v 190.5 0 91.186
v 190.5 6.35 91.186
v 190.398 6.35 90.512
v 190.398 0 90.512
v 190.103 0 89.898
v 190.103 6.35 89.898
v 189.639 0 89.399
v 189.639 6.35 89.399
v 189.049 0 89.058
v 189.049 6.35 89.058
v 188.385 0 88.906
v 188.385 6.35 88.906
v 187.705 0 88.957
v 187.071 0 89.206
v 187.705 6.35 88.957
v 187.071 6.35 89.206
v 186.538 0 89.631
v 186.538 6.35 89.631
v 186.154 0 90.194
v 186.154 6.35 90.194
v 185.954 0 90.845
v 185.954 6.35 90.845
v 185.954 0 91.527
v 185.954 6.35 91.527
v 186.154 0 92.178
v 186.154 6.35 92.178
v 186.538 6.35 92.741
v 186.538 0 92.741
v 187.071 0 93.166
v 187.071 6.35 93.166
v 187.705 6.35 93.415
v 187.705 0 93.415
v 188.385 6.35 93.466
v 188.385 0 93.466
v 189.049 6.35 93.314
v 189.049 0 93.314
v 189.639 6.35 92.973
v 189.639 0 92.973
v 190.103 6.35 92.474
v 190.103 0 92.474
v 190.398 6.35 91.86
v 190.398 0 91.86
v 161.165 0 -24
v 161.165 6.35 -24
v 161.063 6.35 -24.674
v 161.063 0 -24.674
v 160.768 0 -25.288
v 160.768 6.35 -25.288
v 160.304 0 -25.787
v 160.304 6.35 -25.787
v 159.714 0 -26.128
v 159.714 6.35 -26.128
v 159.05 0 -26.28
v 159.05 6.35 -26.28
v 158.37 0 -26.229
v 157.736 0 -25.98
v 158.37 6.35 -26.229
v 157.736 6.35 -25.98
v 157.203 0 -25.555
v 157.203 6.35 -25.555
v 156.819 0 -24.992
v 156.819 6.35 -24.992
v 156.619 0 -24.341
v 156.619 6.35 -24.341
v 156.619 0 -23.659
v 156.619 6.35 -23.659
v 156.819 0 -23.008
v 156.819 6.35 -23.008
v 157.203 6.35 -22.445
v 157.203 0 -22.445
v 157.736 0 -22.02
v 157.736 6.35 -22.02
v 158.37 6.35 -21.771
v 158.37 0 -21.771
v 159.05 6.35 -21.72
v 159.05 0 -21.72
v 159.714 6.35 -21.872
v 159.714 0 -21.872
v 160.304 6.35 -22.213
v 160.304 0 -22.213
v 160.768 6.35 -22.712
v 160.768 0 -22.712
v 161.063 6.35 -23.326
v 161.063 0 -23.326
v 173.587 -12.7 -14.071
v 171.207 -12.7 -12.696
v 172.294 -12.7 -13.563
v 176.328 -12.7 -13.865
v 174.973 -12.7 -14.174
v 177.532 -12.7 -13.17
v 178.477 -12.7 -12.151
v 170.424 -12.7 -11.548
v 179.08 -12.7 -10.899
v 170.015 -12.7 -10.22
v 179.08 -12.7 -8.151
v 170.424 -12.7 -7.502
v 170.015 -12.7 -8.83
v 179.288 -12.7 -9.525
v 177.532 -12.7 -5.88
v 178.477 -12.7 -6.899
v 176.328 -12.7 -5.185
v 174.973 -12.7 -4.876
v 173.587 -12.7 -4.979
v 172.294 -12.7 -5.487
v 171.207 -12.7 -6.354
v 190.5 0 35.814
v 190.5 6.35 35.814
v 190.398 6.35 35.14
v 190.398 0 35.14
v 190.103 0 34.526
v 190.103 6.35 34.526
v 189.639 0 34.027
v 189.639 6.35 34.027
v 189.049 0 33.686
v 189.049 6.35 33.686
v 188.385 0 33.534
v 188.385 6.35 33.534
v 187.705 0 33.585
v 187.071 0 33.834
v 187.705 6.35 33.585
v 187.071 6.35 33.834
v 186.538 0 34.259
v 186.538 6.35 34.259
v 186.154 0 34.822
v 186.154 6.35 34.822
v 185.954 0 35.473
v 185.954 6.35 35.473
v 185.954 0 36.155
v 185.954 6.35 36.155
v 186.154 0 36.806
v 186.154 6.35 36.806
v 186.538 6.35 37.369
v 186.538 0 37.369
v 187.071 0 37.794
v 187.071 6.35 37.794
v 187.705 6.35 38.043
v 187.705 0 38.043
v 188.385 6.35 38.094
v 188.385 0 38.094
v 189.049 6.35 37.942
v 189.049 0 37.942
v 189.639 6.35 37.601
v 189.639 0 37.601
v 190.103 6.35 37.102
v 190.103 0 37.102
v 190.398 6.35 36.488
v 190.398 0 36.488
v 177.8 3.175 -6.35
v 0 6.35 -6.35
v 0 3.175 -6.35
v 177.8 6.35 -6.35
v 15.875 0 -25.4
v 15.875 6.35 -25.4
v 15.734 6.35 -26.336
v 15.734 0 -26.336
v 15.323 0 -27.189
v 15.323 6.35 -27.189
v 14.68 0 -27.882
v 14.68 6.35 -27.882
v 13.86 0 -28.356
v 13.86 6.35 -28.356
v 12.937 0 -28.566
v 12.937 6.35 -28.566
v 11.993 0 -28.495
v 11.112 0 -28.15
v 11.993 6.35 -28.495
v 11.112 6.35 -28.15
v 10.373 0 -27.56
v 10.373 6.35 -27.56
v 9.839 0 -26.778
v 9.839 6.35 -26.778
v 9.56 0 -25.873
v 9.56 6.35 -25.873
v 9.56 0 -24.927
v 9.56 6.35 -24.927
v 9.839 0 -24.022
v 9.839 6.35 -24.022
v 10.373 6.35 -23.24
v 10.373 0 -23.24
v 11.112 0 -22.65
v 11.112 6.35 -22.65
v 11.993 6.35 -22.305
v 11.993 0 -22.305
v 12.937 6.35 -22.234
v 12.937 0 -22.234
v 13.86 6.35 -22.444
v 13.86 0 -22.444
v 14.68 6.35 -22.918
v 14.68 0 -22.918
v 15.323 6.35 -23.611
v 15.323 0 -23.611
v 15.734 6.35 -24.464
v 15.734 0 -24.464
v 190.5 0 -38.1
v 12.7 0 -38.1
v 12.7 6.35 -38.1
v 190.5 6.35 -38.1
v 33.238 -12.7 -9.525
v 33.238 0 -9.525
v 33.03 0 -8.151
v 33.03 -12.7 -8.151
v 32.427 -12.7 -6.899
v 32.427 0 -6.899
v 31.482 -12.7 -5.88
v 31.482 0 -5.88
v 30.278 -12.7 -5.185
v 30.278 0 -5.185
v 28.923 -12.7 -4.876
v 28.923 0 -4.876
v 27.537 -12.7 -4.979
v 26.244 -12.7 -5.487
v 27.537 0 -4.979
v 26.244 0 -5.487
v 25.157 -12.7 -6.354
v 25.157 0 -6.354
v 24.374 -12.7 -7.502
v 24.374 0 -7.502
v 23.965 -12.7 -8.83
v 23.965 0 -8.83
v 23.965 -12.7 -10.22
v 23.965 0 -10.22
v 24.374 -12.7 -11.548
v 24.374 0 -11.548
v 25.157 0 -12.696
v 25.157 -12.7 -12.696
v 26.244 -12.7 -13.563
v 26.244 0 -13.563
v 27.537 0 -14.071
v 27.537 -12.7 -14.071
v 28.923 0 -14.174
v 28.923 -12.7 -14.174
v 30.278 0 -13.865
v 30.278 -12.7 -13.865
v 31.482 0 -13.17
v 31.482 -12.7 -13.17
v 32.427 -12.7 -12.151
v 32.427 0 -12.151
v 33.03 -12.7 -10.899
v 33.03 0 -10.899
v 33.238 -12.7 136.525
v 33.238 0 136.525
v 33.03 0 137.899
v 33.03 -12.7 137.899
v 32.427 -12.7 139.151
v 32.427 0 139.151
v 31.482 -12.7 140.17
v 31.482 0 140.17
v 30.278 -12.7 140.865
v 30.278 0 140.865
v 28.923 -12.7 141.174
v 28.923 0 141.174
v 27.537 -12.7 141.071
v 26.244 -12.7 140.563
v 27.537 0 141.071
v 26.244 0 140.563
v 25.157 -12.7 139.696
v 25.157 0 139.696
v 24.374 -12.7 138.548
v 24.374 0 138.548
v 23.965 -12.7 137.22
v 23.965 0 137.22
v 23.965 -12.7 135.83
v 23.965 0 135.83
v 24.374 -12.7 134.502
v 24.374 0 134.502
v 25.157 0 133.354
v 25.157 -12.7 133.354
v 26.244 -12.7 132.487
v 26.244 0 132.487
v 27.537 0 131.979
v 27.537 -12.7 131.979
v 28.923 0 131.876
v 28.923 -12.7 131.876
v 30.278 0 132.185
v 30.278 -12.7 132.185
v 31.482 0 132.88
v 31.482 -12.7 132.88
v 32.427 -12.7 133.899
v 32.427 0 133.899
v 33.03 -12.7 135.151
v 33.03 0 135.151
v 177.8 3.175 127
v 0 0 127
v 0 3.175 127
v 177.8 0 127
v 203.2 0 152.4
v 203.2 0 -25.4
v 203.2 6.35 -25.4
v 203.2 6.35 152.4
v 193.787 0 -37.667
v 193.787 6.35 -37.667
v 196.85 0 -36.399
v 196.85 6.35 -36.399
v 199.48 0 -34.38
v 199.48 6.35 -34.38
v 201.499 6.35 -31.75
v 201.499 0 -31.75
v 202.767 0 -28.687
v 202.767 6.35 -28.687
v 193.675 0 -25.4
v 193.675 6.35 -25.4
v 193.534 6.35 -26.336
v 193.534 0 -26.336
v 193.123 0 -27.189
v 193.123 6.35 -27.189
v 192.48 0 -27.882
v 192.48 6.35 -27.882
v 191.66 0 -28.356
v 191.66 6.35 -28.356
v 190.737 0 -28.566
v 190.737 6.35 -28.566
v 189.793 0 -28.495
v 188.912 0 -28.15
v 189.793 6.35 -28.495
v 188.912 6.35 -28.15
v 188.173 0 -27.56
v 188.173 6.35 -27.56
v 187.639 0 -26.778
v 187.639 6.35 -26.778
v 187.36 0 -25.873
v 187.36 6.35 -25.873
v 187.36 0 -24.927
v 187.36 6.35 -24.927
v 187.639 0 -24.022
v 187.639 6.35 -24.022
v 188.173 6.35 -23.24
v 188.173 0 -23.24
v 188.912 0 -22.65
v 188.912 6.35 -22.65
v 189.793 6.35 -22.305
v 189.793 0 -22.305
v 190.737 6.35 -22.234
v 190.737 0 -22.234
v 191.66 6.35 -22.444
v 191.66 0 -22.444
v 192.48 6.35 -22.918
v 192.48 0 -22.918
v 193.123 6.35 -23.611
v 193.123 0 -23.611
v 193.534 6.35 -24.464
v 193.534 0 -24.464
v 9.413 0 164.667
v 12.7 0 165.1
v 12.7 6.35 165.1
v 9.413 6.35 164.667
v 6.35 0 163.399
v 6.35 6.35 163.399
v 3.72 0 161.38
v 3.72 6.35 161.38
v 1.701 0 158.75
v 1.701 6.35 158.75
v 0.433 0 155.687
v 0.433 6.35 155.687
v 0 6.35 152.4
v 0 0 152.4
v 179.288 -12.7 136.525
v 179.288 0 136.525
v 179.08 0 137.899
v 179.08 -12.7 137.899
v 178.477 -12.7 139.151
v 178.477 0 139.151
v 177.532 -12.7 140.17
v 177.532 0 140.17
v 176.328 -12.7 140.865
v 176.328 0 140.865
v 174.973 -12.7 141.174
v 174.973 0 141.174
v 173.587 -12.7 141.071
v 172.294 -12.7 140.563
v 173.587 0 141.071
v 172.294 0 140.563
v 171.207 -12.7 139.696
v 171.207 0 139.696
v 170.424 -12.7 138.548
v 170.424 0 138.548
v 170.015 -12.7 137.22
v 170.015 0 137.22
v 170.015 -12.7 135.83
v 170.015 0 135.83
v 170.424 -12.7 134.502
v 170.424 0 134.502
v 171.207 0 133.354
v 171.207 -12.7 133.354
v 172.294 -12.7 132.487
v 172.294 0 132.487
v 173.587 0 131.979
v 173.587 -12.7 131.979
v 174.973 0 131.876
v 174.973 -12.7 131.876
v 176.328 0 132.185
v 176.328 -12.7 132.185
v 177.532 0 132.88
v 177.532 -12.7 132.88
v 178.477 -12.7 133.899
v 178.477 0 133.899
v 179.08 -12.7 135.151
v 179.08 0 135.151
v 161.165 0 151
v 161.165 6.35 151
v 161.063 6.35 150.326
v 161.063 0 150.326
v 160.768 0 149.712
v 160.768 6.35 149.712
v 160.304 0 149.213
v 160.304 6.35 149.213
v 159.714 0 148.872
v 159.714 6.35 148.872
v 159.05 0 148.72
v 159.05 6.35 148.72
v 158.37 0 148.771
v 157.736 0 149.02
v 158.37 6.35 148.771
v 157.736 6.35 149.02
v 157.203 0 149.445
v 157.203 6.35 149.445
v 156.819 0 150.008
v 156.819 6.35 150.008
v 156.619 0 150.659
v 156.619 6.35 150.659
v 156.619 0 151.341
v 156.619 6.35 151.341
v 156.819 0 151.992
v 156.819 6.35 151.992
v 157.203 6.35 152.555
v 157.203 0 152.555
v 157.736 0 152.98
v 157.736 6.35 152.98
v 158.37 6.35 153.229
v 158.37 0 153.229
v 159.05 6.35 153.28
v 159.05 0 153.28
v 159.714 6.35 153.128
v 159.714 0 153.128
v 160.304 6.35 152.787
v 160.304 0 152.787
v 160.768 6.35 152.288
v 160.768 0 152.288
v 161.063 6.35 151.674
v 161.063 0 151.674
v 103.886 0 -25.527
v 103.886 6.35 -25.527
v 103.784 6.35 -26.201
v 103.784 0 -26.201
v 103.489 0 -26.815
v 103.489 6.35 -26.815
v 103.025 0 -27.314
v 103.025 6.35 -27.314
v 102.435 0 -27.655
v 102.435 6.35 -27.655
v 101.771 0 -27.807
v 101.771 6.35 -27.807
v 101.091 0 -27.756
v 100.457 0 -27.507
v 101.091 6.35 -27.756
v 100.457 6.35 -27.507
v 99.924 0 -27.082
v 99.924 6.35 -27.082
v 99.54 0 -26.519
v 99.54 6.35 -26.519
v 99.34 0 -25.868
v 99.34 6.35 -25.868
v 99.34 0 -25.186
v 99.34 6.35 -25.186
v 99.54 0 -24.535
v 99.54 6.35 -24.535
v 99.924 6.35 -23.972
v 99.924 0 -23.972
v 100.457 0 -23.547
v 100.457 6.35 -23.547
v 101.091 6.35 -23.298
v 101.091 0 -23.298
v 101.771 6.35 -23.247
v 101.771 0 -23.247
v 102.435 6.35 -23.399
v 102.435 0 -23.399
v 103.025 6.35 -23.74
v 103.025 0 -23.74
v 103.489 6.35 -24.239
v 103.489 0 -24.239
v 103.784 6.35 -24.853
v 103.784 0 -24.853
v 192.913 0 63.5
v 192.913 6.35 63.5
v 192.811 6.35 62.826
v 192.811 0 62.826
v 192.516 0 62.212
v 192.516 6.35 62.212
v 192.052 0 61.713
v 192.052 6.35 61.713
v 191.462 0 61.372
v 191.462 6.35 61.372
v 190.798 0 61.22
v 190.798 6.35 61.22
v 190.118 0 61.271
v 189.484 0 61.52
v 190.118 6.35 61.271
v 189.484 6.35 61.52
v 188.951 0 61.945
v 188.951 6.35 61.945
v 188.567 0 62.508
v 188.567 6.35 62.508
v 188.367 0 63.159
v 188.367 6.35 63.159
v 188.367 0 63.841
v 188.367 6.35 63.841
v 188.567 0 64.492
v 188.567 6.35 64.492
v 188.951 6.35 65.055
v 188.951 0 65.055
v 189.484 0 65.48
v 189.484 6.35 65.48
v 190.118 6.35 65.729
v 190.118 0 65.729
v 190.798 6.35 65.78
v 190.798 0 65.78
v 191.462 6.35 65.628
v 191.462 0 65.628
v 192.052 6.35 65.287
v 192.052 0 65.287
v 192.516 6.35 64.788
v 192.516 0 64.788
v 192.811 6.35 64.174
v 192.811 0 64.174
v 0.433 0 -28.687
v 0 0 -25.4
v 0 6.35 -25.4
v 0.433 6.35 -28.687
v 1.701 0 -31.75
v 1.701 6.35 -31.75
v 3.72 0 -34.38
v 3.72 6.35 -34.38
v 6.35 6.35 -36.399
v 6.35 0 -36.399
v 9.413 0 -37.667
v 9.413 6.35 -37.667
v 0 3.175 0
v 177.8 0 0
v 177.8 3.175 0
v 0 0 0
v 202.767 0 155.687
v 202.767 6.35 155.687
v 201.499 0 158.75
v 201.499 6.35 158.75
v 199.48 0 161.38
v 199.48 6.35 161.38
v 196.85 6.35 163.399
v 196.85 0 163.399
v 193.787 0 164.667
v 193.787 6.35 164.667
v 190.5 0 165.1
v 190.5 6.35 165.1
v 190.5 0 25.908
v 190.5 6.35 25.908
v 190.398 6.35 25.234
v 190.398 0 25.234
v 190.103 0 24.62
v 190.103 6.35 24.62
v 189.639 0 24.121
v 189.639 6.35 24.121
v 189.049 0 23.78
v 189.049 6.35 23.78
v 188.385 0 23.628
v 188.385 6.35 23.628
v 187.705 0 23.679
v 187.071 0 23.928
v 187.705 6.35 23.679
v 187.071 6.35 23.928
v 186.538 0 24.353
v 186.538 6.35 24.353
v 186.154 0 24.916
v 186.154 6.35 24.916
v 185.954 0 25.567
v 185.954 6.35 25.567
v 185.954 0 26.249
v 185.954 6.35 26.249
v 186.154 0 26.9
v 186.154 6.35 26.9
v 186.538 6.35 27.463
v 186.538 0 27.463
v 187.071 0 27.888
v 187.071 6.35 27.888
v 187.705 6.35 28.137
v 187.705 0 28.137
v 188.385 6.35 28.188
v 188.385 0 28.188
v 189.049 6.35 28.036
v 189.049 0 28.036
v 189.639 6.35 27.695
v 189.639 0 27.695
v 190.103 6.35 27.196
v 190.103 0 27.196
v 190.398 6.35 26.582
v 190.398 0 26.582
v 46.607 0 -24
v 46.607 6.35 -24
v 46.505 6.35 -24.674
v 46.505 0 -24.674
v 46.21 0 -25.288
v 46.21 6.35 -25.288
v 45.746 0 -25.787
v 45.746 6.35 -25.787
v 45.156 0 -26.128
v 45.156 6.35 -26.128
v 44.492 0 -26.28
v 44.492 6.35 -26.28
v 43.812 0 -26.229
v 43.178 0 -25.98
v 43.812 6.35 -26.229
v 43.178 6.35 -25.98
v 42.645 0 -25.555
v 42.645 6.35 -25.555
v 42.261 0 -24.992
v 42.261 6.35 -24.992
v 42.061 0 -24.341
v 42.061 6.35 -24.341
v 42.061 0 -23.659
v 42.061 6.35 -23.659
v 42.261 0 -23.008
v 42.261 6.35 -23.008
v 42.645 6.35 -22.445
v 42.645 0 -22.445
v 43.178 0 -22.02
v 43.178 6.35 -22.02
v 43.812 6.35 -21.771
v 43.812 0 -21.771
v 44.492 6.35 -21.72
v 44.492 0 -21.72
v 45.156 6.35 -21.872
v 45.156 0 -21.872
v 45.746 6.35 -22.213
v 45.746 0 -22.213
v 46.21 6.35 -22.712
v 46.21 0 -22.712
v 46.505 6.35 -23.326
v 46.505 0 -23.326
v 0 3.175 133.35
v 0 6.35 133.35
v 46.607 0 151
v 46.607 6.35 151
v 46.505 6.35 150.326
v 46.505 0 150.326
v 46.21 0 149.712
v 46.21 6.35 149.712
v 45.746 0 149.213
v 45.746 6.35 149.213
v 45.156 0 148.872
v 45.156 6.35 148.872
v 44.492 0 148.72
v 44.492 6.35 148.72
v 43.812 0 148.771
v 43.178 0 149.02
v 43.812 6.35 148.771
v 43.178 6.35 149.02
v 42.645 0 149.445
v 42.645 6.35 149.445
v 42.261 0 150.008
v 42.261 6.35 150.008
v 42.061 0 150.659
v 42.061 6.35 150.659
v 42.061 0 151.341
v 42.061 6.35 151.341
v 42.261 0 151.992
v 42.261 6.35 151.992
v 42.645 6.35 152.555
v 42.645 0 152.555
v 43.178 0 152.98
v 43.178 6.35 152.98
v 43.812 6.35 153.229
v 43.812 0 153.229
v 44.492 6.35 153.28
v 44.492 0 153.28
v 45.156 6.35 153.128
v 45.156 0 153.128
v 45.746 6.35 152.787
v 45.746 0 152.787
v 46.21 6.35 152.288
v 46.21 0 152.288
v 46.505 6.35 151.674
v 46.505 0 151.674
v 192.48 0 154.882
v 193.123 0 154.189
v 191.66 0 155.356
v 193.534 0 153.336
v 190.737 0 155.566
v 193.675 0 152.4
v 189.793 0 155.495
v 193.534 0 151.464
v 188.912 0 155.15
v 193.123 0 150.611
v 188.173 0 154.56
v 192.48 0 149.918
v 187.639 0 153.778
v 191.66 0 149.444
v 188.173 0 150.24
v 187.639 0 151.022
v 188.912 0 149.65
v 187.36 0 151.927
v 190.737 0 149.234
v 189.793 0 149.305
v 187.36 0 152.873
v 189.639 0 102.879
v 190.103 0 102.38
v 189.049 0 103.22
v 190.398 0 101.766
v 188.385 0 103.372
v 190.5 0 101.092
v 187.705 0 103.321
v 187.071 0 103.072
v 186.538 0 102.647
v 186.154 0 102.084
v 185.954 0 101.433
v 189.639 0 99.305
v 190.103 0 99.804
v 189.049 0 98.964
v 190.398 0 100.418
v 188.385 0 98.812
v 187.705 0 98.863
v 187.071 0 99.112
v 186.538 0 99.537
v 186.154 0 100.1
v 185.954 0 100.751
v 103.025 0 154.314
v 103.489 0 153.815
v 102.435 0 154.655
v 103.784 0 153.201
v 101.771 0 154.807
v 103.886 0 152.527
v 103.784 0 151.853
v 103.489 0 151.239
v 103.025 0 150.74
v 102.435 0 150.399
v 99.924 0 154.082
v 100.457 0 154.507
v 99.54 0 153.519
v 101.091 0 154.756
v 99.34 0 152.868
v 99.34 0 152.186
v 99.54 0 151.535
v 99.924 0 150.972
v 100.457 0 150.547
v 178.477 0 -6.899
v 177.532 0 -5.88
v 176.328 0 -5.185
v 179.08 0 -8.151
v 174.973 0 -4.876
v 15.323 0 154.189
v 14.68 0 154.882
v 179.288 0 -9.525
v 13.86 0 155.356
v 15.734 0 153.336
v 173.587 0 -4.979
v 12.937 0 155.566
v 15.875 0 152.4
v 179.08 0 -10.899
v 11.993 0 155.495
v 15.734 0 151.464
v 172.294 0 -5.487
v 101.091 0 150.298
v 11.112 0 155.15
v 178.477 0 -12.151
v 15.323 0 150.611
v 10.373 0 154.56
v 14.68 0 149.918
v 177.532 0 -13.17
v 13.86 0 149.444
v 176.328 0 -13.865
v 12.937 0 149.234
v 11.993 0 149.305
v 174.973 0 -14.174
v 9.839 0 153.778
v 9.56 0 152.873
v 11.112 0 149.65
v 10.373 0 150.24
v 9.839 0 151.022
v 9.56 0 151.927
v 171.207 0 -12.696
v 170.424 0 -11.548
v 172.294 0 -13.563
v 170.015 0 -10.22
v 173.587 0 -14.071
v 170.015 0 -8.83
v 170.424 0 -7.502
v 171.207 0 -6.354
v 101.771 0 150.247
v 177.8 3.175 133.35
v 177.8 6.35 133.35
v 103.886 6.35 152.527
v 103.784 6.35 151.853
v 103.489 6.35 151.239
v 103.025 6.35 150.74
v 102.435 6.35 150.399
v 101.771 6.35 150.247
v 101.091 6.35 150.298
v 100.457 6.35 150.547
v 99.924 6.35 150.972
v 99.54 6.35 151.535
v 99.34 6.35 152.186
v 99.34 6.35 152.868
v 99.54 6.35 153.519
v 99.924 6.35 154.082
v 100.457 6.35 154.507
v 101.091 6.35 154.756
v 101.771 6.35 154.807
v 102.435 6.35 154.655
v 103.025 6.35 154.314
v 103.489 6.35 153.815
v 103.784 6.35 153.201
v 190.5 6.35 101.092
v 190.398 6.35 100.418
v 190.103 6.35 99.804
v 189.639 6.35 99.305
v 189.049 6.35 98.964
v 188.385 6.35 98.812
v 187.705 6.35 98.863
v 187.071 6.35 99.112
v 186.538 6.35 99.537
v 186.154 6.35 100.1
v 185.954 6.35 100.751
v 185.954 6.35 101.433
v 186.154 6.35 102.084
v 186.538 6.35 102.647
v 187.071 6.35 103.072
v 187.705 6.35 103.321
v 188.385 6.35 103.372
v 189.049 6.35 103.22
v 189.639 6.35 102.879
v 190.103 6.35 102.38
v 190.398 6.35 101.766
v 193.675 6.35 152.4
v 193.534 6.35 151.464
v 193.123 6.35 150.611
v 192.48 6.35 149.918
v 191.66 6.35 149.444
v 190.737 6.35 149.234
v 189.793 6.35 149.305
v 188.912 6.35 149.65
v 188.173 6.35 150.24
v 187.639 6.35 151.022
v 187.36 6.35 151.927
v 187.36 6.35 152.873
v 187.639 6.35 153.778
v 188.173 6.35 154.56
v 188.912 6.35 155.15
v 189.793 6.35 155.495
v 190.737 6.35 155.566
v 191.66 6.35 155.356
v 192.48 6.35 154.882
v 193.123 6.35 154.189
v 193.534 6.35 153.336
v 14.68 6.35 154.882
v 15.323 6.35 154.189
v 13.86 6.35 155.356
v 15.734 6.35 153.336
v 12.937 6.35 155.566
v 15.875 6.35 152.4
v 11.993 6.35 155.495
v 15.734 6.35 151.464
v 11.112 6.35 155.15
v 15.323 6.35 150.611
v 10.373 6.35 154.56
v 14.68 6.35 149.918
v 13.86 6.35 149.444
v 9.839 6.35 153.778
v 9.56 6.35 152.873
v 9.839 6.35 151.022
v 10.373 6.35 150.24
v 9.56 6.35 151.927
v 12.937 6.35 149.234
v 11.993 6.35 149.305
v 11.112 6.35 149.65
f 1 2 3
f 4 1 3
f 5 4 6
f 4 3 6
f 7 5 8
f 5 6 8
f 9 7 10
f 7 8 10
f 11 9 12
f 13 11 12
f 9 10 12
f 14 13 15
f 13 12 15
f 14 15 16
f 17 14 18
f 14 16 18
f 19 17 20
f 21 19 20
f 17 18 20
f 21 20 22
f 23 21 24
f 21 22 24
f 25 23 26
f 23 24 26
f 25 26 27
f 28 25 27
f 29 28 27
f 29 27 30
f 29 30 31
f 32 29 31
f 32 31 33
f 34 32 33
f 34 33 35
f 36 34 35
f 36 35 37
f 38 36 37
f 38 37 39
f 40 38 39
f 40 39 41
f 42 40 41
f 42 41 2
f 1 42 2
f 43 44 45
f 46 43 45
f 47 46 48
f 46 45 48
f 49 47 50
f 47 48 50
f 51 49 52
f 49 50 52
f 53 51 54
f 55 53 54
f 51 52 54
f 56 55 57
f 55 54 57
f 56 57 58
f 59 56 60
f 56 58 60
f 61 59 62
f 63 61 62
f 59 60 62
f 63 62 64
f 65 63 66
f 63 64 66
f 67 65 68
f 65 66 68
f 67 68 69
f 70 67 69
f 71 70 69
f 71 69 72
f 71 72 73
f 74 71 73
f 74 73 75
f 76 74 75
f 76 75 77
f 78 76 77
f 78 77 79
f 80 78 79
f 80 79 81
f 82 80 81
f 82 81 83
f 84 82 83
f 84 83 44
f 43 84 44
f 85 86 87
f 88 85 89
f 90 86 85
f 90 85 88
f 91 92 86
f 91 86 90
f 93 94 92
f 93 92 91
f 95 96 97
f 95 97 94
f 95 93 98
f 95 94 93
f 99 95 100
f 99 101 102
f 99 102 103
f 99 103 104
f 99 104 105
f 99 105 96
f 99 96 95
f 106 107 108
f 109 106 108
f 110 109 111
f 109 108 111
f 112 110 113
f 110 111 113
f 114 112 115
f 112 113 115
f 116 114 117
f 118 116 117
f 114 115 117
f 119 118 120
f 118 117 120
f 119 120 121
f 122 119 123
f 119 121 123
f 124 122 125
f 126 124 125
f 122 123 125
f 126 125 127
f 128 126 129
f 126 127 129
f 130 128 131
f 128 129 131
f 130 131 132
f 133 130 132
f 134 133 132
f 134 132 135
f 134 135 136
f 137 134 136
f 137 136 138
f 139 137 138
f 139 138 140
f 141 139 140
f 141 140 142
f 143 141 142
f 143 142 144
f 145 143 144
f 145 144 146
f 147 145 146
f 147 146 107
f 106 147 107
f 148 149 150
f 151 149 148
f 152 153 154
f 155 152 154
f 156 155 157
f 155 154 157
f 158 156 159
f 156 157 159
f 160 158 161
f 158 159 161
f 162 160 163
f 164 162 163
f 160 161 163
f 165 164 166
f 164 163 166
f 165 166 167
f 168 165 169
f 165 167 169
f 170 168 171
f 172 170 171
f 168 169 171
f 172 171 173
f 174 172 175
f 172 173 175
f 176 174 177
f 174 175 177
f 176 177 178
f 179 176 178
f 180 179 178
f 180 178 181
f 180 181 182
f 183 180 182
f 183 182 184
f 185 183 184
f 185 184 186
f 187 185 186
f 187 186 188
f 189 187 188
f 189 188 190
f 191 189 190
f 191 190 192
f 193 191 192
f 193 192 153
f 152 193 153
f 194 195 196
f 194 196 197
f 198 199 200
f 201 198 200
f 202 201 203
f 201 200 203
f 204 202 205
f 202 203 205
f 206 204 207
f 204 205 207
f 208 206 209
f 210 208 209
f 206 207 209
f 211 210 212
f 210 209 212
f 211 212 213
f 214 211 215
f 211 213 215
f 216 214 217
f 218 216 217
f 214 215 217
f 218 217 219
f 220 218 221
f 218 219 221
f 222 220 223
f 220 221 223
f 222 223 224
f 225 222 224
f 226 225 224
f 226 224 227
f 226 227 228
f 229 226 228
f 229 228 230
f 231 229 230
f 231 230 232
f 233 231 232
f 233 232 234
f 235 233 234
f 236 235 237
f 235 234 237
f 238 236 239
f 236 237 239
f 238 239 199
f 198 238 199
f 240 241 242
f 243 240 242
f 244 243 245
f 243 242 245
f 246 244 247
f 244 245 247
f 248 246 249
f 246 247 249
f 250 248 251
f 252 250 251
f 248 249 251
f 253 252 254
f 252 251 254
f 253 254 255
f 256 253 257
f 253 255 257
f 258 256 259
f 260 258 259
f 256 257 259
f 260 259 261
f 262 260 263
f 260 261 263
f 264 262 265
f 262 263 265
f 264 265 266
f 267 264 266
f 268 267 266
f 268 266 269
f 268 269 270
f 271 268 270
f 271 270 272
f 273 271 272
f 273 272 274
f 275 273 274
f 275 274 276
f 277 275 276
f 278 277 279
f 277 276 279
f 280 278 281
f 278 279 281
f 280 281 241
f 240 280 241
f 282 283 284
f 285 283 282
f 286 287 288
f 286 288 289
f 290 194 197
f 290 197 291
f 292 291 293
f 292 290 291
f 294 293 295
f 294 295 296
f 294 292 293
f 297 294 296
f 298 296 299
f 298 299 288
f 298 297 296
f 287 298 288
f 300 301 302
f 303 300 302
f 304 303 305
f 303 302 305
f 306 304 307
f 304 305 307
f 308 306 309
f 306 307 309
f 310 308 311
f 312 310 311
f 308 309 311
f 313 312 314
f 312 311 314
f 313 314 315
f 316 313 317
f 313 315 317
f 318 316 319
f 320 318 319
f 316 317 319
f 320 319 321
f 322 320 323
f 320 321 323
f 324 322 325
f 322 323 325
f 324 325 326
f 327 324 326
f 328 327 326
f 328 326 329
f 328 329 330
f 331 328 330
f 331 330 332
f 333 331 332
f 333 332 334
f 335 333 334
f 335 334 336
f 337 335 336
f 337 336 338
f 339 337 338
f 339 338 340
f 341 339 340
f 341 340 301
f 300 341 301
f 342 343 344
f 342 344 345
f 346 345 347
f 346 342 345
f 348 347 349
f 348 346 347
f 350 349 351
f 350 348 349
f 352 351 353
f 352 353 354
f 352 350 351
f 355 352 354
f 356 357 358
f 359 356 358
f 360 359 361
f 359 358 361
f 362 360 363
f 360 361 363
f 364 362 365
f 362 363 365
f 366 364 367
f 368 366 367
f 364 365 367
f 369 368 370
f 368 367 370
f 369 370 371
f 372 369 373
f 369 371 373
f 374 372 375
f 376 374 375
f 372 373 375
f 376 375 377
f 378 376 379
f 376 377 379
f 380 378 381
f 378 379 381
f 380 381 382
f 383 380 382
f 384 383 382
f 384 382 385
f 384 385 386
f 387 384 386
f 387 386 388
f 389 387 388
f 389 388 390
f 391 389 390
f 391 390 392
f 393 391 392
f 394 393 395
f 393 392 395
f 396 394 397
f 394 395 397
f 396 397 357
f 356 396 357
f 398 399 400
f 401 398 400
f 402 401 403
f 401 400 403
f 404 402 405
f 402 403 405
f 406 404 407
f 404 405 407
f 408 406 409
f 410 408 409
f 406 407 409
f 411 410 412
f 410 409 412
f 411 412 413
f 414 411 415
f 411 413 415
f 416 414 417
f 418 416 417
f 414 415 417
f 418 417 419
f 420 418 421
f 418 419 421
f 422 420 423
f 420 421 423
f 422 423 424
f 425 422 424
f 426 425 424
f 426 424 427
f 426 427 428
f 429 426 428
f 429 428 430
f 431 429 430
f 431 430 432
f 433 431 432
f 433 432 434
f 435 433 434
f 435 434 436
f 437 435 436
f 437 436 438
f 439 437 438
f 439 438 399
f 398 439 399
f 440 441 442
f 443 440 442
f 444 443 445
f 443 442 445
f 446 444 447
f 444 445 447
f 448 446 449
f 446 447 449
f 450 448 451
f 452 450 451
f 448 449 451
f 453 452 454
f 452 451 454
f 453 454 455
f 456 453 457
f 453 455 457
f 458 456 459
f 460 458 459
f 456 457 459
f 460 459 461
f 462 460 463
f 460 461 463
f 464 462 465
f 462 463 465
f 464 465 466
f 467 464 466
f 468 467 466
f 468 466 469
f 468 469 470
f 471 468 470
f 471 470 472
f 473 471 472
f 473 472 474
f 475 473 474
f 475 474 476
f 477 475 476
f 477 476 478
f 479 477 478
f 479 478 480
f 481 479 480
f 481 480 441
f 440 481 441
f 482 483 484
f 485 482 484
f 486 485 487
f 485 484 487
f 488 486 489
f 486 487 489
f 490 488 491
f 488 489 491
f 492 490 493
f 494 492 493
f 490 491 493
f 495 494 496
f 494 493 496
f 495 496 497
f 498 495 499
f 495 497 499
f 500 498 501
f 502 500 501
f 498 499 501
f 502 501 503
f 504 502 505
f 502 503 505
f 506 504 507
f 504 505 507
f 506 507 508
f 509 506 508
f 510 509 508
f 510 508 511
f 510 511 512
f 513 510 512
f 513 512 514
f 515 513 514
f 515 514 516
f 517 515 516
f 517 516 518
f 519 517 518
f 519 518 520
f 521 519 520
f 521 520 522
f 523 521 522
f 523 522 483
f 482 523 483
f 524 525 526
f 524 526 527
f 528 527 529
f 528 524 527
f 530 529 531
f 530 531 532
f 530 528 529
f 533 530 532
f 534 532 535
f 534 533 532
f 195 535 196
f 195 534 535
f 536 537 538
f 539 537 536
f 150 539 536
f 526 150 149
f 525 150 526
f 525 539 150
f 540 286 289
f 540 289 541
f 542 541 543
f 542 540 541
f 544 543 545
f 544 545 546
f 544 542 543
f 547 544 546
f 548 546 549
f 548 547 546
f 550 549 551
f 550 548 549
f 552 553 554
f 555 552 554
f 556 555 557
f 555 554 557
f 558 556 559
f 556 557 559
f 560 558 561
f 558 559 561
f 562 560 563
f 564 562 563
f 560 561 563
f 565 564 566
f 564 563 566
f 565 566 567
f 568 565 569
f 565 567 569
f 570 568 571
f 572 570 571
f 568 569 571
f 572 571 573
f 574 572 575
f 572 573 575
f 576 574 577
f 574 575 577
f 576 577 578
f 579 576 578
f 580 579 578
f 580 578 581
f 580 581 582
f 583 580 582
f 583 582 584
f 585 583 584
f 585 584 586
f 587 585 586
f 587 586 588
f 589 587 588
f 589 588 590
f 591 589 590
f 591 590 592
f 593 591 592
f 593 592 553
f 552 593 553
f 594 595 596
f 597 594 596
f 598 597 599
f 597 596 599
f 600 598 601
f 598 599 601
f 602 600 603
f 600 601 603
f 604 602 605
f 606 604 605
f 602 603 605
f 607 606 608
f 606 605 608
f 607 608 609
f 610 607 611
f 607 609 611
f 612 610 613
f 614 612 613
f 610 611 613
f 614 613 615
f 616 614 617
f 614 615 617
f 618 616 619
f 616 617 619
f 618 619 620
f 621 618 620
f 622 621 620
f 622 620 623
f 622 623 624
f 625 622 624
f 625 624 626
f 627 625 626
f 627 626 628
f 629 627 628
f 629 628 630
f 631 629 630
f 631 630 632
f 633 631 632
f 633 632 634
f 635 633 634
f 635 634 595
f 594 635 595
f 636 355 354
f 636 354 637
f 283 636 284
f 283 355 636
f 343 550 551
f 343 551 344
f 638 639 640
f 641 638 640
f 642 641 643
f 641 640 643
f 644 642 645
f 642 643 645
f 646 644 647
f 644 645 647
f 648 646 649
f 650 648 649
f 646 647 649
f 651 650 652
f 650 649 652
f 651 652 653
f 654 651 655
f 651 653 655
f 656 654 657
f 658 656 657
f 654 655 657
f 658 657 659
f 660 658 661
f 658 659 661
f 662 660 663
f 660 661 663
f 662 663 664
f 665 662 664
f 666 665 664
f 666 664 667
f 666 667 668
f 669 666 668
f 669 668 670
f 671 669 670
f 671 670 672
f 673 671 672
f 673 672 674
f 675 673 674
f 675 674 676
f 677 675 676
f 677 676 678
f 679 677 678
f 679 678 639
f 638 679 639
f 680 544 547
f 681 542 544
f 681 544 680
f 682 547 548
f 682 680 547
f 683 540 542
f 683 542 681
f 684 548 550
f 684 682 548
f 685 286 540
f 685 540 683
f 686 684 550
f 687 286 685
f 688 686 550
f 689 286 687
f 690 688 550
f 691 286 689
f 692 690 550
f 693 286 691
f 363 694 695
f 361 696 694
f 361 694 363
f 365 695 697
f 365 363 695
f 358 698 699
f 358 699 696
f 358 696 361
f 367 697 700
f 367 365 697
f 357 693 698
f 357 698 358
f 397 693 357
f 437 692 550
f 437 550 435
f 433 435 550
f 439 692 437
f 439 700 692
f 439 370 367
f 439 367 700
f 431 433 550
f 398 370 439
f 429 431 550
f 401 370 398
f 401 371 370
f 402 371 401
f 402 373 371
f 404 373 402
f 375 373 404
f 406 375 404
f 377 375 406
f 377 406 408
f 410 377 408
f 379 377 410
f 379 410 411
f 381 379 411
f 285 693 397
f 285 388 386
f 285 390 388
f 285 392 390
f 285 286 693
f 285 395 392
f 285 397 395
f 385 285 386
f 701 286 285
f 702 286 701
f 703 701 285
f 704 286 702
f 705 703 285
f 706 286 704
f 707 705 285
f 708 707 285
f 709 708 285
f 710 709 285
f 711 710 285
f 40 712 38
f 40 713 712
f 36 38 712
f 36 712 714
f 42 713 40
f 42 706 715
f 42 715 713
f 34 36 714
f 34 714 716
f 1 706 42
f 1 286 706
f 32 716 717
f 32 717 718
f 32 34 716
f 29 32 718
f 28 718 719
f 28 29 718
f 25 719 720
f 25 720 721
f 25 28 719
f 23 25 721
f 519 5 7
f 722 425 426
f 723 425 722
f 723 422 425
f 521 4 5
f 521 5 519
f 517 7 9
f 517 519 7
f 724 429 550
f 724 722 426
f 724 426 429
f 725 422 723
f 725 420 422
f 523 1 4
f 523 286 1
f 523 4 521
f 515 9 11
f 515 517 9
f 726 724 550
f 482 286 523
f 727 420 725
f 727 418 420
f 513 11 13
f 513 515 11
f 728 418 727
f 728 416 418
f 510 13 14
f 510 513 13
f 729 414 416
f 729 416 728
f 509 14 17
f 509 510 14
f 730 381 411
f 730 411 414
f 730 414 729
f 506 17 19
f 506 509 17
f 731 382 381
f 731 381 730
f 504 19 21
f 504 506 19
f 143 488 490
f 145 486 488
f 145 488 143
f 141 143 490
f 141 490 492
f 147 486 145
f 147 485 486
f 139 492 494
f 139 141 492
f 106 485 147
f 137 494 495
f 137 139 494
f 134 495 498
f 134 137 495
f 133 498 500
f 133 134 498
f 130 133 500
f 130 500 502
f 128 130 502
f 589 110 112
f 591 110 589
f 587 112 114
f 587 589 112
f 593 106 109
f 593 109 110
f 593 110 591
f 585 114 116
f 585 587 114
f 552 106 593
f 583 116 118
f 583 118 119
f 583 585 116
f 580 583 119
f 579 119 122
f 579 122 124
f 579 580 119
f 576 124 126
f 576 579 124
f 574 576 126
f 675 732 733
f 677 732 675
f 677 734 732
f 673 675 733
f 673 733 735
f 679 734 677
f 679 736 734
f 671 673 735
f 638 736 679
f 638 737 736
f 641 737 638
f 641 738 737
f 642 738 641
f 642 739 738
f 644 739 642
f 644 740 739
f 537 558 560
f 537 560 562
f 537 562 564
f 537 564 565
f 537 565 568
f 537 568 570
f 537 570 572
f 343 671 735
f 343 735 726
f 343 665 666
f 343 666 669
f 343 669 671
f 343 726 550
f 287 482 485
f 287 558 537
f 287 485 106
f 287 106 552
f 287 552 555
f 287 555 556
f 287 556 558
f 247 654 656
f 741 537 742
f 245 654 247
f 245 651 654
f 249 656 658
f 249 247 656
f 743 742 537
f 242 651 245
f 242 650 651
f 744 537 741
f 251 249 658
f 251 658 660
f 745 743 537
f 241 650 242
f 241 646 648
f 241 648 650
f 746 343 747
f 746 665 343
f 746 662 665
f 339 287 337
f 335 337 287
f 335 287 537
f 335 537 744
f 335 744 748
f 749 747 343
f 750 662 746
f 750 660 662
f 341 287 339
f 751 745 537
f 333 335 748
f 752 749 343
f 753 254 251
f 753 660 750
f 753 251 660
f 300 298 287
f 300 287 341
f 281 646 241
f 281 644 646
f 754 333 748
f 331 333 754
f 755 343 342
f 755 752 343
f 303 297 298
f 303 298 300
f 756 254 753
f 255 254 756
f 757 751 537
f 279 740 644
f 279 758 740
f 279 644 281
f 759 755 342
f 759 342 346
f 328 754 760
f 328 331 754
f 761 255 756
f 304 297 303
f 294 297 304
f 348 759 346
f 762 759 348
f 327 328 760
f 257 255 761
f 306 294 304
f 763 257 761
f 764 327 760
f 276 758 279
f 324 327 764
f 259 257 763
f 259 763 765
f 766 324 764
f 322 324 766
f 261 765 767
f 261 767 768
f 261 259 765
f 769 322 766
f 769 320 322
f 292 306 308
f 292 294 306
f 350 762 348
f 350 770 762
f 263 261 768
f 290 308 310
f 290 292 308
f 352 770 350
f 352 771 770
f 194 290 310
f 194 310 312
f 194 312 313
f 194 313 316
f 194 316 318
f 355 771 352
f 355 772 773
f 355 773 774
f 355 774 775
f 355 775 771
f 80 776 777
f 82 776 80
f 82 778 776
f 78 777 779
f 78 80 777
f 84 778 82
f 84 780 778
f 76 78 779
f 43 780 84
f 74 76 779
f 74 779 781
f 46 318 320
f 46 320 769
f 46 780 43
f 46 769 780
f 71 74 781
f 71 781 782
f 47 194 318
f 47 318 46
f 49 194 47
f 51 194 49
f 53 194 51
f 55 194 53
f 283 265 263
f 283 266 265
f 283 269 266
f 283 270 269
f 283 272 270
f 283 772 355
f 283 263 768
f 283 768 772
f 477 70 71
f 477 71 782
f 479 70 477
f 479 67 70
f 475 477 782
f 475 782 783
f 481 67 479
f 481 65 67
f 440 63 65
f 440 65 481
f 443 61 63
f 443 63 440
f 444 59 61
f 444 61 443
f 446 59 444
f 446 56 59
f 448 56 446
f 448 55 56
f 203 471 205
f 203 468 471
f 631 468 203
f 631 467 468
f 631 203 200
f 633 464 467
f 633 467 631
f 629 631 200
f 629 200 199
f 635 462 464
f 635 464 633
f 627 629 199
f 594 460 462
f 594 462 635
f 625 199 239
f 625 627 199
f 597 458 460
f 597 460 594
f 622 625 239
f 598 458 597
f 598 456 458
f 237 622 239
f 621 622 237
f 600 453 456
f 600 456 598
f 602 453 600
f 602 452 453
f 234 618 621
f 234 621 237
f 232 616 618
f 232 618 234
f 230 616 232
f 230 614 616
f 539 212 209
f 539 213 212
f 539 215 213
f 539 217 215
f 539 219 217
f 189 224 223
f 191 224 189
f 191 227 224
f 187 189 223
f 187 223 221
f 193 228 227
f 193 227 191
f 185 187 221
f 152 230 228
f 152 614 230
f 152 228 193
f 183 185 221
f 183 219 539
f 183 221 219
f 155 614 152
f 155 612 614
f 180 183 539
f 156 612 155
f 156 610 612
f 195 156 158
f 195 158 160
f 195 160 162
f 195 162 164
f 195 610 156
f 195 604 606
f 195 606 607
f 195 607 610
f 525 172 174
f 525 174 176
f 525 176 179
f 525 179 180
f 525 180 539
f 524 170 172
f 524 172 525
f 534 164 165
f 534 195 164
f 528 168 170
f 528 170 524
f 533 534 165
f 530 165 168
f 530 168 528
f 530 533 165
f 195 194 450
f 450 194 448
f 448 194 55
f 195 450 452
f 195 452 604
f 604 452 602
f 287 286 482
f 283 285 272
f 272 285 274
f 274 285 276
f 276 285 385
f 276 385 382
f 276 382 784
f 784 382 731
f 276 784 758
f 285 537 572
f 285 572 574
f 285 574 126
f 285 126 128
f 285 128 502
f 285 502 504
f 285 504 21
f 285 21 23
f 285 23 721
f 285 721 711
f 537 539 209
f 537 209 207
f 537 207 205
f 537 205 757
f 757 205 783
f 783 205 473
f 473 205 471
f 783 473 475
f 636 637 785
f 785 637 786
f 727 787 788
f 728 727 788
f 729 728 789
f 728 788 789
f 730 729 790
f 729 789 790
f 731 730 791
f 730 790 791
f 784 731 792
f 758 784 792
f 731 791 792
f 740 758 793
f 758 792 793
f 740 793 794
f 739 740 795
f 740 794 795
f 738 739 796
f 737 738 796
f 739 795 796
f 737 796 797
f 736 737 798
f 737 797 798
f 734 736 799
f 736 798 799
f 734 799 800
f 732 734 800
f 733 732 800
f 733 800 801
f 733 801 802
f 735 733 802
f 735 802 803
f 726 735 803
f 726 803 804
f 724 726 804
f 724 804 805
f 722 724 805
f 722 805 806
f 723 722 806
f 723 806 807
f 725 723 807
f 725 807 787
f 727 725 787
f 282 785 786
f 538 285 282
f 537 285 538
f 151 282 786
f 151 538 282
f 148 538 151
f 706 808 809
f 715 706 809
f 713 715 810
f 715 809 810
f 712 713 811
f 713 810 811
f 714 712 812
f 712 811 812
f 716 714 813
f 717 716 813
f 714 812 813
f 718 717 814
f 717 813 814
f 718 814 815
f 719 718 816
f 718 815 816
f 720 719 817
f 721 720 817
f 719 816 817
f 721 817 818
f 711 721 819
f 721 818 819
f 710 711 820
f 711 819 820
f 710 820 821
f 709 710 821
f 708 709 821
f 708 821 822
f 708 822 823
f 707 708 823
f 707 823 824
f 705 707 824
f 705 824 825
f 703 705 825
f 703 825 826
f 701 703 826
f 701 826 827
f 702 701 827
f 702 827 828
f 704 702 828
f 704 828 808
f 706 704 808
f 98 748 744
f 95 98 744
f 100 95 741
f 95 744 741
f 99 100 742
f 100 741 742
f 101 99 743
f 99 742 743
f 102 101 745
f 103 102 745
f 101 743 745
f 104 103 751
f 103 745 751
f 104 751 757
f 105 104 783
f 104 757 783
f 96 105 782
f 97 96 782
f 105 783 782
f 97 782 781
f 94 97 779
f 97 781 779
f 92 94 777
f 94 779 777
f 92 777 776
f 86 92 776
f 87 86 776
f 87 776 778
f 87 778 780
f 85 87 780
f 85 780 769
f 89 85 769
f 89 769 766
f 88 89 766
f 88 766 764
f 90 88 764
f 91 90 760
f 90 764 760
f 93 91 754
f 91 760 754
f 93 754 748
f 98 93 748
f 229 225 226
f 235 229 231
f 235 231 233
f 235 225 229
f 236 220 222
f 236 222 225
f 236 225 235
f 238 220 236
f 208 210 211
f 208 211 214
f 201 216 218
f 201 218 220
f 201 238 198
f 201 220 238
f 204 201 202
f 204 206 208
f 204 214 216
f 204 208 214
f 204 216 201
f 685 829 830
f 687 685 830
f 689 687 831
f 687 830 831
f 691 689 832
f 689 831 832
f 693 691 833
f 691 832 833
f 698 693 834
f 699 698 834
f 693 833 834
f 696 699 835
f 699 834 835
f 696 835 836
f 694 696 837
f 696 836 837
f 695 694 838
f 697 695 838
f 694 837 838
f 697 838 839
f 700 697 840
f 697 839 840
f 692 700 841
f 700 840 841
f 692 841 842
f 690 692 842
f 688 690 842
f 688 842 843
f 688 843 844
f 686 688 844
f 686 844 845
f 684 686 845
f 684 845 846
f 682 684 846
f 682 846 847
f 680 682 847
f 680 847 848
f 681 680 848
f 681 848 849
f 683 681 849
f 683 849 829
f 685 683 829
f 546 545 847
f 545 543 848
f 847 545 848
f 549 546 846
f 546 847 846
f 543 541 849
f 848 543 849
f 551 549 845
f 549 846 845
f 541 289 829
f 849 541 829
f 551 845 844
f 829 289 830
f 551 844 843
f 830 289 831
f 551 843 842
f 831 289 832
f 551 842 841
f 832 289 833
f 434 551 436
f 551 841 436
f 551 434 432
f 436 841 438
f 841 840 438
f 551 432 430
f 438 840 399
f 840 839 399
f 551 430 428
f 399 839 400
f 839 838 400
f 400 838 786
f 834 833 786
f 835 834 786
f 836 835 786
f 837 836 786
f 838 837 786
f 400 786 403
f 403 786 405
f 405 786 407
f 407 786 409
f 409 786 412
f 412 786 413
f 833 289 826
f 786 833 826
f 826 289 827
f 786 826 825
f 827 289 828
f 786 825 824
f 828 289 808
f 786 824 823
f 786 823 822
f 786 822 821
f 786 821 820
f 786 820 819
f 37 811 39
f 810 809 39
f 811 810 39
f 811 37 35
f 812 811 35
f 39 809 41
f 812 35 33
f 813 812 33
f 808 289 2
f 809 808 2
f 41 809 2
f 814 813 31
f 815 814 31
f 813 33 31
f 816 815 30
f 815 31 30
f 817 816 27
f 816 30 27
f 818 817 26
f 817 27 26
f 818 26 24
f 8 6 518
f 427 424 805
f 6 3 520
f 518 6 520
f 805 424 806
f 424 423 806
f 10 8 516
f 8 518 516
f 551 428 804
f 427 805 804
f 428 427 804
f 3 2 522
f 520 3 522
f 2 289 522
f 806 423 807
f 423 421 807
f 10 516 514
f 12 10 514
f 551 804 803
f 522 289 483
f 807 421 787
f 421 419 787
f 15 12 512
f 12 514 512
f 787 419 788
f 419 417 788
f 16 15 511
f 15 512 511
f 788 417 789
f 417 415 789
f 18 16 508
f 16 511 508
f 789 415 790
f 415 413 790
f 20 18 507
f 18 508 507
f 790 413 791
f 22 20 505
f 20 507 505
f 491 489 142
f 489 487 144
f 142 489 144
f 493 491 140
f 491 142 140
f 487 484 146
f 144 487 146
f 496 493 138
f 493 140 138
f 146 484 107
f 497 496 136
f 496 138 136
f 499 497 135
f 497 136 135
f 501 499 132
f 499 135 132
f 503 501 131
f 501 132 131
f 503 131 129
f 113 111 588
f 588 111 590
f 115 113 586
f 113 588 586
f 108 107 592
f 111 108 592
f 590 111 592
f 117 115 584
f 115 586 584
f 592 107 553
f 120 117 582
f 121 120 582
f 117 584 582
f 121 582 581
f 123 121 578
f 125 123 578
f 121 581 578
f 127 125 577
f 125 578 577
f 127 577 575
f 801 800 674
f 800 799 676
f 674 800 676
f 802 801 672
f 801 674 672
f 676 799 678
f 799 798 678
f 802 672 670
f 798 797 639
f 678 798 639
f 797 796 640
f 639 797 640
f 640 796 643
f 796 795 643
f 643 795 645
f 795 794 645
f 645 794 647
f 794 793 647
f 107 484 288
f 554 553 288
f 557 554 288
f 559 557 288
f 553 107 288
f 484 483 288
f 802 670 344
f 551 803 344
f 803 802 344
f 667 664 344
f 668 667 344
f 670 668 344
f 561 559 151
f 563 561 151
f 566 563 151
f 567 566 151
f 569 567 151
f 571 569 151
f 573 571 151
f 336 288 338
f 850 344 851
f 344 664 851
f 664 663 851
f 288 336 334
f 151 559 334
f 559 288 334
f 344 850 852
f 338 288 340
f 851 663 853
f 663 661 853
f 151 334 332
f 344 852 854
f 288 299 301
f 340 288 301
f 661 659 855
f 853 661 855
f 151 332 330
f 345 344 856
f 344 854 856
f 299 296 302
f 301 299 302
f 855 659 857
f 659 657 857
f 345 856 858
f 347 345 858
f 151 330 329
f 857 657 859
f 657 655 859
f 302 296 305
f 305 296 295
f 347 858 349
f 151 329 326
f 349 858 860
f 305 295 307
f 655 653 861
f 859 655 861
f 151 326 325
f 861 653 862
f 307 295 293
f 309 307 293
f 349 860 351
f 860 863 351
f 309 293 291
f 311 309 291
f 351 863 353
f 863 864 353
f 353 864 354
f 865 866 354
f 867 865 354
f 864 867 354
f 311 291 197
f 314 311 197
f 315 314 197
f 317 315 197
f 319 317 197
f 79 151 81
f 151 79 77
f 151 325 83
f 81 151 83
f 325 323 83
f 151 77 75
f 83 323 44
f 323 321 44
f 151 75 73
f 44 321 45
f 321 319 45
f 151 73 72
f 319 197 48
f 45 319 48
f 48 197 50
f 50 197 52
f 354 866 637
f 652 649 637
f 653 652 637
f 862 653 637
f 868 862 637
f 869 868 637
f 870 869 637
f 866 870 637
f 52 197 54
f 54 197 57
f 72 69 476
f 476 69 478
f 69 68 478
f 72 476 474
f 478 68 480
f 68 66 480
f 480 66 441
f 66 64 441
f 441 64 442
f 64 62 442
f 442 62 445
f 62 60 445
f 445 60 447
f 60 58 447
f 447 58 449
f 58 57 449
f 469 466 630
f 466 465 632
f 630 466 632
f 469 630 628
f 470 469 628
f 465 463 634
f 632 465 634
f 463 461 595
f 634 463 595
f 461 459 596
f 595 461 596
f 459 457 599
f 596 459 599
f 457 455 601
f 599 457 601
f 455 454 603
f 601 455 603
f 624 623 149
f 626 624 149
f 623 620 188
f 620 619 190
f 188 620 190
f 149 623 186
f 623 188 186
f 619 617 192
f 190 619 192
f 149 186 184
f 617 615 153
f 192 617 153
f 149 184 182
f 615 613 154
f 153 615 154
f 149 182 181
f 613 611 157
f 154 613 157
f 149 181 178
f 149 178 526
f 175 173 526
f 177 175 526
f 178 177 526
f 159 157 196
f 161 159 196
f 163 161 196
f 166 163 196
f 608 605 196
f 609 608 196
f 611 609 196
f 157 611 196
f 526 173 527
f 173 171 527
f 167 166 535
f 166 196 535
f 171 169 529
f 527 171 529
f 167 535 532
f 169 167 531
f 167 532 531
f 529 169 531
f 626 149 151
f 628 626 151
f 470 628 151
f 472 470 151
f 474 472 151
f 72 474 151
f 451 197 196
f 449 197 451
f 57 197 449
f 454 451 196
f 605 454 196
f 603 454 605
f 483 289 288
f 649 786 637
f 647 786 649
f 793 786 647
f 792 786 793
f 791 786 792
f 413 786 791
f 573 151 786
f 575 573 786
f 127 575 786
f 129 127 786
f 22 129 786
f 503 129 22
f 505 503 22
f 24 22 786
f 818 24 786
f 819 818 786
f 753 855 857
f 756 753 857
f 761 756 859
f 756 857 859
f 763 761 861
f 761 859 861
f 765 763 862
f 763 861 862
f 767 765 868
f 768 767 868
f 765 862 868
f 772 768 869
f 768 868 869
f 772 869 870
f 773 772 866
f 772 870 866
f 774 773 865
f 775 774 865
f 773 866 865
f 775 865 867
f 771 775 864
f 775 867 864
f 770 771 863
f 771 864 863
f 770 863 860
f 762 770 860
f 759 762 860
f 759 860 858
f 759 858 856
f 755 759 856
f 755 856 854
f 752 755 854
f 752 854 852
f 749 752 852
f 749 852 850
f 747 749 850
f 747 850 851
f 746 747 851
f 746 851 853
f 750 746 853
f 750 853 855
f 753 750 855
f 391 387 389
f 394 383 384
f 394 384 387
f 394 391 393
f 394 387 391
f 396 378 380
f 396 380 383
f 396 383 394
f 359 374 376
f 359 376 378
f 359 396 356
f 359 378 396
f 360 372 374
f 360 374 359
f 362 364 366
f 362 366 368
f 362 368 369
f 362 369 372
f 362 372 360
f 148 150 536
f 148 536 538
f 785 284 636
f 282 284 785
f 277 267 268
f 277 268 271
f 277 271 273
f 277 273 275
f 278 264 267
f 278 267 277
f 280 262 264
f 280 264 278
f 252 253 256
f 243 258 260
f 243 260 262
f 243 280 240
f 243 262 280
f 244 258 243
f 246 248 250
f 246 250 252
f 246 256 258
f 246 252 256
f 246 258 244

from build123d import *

# Parameters (mm, degrees)
BOSS_EXTRUDE2_DEPTH = 6.35
SKETCH2_R           = 3.175
CUT_EXTRUDE1_DEPTH  = 7.35
SKETCH5_R           = 4.6625
BOSS_EXTRUDE3_DEPTH = 12.7
SKETCH6_W           = 177.8
SKETCH6_H           = 6.35
CUT_EXTRUDE2_DEPTH  = 3.175
SKETCH7_R           = 2.286
CUT_EXTRUDE3_DEPTH  = 12.7
SKETCH8_R           = 2.286
CUT_EXTRUDE4_DEPTH  = 20.05
SKETCH9_R           = 2.286
CUT_EXTRUDE5_DEPTH  = 20.05


with BuildPart() as part:
    # Sketch1 → Boss-Extrude2 (new body)
    with BuildSketch(Plane(origin=(0, 0, 0), x_dir=(1, 0, 0), z_dir=(0, 1, 0))):
        with BuildLine():
            Line((0, 0), (0, 25.4))
            ThreePointArc((0, 25.4), (3.719743879, 34.380256121), (12.7, 38.1))
            Line((12.7, 38.1), (190.5, 38.1))
            ThreePointArc((190.5, 38.1), (199.480256121, 34.380256121), (203.2, 25.4))
            Line((203.2, 25.4), (203.2, -152.4))
            ThreePointArc((203.2, -152.4), (199.480256121, -161.380256121), (190.5, -165.1))
            Line((190.5, -165.1), (12.7, -165.1))
            ThreePointArc((12.7, -165.1), (3.719743879, -161.380256121), (0, -152.4))
            Line((0, -152.4), (0, -127))
            Line((0, -127), (177.8, -127))
            Line((177.8, -127), (177.8, 0))
            Line((177.8, 0), (0, 0))
        make_face()
    extrude(amount=BOSS_EXTRUDE2_DEPTH)

    # Sketch2 → Cut-Extrude1 (cut, through all)
    with BuildSketch(Plane(origin=(0, 6.35, 0), x_dir=(1, 0, 0), z_dir=(0, 1, 0))):
        with Locations((12.7, 25.4)):
            Circle(SKETCH2_R)
        with Locations((190.5, 25.4)):
            Circle(SKETCH2_R)
        with Locations((190.5, -152.4)):
            Circle(SKETCH2_R)
        with Locations((12.7, -152.4)):
            Circle(SKETCH2_R)
    extrude(amount=-CUT_EXTRUDE1_DEPTH, mode=Mode.SUBTRACT)

    # Sketch5 → Boss-Extrude3 (add)
    with BuildSketch(Plane.XZ):
        with Locations((28.575, 136.525)):
            Circle(SKETCH5_R)
        with Locations((174.625, 136.525)):
            Circle(SKETCH5_R)
        with Locations((174.625, -9.525)):
            Circle(SKETCH5_R)
        with Locations((28.575, -9.525)):
            Circle(SKETCH5_R)
    extrude(amount=BOSS_EXTRUDE3_DEPTH)

    # Sketch6 → Cut-Extrude2 (cut)
    with BuildSketch(Plane(origin=(0, 6.35, 0), x_dir=(1, 0, 0), z_dir=(0, 1, 0))):
        with Locations((88.9, -130.175)):
            Rectangle(SKETCH6_W, SKETCH6_H)
        with Locations((88.9, 3.175)):
            Rectangle(SKETCH6_W, SKETCH6_H)
    extrude(amount=-CUT_EXTRUDE2_DEPTH, mode=Mode.SUBTRACT)

    # Sketch7 → Cut-Extrude3 (cut)
    with BuildSketch(Plane(origin=(0, 6.35, 0), x_dir=(1, 0, 0), z_dir=(0, 1, 0))):
        with Locations((188.214, -101.092)):
            Circle(SKETCH7_R)
        with Locations((188.214, -91.186)):
            Circle(SKETCH7_R)
        with Locations((188.214, -35.814)):
            Circle(SKETCH7_R)
        with Locations((188.214, -25.908)):
            Circle(SKETCH7_R)
    extrude(amount=-CUT_EXTRUDE3_DEPTH, mode=Mode.SUBTRACT)

    # Sketch8 → Cut-Extrude4 (cut, through all)
    with BuildSketch(Plane(origin=(0, 6.35, 0), x_dir=(1, 0, 0), z_dir=(0, 1, 0))):
        with Locations((101.6, 25.527)):
            Circle(SKETCH8_R)
        with Locations((190.627, -63.5)):
            Circle(SKETCH8_R)
        with Locations((101.6, -152.527)):
            Circle(SKETCH8_R)
    extrude(amount=-CUT_EXTRUDE4_DEPTH, mode=Mode.SUBTRACT)

    # Sketch9 → Cut-Extrude5 (cut, through all)
    with BuildSketch(Plane(origin=(0, 6.35, 0), x_dir=(1, 0, 0), z_dir=(0, 1, 0))):
        with Locations((44.321, 24)):
            Circle(SKETCH9_R)
        with Locations((44.321, -151)):
            Circle(SKETCH9_R)
        with Locations((158.879, -151)):
            Circle(SKETCH9_R)
        with Locations((158.879, 24)):
            Circle(SKETCH9_R)
    extrude(amount=-CUT_EXTRUDE5_DEPTH, mode=Mode.SUBTRACT)


solid = part.part
